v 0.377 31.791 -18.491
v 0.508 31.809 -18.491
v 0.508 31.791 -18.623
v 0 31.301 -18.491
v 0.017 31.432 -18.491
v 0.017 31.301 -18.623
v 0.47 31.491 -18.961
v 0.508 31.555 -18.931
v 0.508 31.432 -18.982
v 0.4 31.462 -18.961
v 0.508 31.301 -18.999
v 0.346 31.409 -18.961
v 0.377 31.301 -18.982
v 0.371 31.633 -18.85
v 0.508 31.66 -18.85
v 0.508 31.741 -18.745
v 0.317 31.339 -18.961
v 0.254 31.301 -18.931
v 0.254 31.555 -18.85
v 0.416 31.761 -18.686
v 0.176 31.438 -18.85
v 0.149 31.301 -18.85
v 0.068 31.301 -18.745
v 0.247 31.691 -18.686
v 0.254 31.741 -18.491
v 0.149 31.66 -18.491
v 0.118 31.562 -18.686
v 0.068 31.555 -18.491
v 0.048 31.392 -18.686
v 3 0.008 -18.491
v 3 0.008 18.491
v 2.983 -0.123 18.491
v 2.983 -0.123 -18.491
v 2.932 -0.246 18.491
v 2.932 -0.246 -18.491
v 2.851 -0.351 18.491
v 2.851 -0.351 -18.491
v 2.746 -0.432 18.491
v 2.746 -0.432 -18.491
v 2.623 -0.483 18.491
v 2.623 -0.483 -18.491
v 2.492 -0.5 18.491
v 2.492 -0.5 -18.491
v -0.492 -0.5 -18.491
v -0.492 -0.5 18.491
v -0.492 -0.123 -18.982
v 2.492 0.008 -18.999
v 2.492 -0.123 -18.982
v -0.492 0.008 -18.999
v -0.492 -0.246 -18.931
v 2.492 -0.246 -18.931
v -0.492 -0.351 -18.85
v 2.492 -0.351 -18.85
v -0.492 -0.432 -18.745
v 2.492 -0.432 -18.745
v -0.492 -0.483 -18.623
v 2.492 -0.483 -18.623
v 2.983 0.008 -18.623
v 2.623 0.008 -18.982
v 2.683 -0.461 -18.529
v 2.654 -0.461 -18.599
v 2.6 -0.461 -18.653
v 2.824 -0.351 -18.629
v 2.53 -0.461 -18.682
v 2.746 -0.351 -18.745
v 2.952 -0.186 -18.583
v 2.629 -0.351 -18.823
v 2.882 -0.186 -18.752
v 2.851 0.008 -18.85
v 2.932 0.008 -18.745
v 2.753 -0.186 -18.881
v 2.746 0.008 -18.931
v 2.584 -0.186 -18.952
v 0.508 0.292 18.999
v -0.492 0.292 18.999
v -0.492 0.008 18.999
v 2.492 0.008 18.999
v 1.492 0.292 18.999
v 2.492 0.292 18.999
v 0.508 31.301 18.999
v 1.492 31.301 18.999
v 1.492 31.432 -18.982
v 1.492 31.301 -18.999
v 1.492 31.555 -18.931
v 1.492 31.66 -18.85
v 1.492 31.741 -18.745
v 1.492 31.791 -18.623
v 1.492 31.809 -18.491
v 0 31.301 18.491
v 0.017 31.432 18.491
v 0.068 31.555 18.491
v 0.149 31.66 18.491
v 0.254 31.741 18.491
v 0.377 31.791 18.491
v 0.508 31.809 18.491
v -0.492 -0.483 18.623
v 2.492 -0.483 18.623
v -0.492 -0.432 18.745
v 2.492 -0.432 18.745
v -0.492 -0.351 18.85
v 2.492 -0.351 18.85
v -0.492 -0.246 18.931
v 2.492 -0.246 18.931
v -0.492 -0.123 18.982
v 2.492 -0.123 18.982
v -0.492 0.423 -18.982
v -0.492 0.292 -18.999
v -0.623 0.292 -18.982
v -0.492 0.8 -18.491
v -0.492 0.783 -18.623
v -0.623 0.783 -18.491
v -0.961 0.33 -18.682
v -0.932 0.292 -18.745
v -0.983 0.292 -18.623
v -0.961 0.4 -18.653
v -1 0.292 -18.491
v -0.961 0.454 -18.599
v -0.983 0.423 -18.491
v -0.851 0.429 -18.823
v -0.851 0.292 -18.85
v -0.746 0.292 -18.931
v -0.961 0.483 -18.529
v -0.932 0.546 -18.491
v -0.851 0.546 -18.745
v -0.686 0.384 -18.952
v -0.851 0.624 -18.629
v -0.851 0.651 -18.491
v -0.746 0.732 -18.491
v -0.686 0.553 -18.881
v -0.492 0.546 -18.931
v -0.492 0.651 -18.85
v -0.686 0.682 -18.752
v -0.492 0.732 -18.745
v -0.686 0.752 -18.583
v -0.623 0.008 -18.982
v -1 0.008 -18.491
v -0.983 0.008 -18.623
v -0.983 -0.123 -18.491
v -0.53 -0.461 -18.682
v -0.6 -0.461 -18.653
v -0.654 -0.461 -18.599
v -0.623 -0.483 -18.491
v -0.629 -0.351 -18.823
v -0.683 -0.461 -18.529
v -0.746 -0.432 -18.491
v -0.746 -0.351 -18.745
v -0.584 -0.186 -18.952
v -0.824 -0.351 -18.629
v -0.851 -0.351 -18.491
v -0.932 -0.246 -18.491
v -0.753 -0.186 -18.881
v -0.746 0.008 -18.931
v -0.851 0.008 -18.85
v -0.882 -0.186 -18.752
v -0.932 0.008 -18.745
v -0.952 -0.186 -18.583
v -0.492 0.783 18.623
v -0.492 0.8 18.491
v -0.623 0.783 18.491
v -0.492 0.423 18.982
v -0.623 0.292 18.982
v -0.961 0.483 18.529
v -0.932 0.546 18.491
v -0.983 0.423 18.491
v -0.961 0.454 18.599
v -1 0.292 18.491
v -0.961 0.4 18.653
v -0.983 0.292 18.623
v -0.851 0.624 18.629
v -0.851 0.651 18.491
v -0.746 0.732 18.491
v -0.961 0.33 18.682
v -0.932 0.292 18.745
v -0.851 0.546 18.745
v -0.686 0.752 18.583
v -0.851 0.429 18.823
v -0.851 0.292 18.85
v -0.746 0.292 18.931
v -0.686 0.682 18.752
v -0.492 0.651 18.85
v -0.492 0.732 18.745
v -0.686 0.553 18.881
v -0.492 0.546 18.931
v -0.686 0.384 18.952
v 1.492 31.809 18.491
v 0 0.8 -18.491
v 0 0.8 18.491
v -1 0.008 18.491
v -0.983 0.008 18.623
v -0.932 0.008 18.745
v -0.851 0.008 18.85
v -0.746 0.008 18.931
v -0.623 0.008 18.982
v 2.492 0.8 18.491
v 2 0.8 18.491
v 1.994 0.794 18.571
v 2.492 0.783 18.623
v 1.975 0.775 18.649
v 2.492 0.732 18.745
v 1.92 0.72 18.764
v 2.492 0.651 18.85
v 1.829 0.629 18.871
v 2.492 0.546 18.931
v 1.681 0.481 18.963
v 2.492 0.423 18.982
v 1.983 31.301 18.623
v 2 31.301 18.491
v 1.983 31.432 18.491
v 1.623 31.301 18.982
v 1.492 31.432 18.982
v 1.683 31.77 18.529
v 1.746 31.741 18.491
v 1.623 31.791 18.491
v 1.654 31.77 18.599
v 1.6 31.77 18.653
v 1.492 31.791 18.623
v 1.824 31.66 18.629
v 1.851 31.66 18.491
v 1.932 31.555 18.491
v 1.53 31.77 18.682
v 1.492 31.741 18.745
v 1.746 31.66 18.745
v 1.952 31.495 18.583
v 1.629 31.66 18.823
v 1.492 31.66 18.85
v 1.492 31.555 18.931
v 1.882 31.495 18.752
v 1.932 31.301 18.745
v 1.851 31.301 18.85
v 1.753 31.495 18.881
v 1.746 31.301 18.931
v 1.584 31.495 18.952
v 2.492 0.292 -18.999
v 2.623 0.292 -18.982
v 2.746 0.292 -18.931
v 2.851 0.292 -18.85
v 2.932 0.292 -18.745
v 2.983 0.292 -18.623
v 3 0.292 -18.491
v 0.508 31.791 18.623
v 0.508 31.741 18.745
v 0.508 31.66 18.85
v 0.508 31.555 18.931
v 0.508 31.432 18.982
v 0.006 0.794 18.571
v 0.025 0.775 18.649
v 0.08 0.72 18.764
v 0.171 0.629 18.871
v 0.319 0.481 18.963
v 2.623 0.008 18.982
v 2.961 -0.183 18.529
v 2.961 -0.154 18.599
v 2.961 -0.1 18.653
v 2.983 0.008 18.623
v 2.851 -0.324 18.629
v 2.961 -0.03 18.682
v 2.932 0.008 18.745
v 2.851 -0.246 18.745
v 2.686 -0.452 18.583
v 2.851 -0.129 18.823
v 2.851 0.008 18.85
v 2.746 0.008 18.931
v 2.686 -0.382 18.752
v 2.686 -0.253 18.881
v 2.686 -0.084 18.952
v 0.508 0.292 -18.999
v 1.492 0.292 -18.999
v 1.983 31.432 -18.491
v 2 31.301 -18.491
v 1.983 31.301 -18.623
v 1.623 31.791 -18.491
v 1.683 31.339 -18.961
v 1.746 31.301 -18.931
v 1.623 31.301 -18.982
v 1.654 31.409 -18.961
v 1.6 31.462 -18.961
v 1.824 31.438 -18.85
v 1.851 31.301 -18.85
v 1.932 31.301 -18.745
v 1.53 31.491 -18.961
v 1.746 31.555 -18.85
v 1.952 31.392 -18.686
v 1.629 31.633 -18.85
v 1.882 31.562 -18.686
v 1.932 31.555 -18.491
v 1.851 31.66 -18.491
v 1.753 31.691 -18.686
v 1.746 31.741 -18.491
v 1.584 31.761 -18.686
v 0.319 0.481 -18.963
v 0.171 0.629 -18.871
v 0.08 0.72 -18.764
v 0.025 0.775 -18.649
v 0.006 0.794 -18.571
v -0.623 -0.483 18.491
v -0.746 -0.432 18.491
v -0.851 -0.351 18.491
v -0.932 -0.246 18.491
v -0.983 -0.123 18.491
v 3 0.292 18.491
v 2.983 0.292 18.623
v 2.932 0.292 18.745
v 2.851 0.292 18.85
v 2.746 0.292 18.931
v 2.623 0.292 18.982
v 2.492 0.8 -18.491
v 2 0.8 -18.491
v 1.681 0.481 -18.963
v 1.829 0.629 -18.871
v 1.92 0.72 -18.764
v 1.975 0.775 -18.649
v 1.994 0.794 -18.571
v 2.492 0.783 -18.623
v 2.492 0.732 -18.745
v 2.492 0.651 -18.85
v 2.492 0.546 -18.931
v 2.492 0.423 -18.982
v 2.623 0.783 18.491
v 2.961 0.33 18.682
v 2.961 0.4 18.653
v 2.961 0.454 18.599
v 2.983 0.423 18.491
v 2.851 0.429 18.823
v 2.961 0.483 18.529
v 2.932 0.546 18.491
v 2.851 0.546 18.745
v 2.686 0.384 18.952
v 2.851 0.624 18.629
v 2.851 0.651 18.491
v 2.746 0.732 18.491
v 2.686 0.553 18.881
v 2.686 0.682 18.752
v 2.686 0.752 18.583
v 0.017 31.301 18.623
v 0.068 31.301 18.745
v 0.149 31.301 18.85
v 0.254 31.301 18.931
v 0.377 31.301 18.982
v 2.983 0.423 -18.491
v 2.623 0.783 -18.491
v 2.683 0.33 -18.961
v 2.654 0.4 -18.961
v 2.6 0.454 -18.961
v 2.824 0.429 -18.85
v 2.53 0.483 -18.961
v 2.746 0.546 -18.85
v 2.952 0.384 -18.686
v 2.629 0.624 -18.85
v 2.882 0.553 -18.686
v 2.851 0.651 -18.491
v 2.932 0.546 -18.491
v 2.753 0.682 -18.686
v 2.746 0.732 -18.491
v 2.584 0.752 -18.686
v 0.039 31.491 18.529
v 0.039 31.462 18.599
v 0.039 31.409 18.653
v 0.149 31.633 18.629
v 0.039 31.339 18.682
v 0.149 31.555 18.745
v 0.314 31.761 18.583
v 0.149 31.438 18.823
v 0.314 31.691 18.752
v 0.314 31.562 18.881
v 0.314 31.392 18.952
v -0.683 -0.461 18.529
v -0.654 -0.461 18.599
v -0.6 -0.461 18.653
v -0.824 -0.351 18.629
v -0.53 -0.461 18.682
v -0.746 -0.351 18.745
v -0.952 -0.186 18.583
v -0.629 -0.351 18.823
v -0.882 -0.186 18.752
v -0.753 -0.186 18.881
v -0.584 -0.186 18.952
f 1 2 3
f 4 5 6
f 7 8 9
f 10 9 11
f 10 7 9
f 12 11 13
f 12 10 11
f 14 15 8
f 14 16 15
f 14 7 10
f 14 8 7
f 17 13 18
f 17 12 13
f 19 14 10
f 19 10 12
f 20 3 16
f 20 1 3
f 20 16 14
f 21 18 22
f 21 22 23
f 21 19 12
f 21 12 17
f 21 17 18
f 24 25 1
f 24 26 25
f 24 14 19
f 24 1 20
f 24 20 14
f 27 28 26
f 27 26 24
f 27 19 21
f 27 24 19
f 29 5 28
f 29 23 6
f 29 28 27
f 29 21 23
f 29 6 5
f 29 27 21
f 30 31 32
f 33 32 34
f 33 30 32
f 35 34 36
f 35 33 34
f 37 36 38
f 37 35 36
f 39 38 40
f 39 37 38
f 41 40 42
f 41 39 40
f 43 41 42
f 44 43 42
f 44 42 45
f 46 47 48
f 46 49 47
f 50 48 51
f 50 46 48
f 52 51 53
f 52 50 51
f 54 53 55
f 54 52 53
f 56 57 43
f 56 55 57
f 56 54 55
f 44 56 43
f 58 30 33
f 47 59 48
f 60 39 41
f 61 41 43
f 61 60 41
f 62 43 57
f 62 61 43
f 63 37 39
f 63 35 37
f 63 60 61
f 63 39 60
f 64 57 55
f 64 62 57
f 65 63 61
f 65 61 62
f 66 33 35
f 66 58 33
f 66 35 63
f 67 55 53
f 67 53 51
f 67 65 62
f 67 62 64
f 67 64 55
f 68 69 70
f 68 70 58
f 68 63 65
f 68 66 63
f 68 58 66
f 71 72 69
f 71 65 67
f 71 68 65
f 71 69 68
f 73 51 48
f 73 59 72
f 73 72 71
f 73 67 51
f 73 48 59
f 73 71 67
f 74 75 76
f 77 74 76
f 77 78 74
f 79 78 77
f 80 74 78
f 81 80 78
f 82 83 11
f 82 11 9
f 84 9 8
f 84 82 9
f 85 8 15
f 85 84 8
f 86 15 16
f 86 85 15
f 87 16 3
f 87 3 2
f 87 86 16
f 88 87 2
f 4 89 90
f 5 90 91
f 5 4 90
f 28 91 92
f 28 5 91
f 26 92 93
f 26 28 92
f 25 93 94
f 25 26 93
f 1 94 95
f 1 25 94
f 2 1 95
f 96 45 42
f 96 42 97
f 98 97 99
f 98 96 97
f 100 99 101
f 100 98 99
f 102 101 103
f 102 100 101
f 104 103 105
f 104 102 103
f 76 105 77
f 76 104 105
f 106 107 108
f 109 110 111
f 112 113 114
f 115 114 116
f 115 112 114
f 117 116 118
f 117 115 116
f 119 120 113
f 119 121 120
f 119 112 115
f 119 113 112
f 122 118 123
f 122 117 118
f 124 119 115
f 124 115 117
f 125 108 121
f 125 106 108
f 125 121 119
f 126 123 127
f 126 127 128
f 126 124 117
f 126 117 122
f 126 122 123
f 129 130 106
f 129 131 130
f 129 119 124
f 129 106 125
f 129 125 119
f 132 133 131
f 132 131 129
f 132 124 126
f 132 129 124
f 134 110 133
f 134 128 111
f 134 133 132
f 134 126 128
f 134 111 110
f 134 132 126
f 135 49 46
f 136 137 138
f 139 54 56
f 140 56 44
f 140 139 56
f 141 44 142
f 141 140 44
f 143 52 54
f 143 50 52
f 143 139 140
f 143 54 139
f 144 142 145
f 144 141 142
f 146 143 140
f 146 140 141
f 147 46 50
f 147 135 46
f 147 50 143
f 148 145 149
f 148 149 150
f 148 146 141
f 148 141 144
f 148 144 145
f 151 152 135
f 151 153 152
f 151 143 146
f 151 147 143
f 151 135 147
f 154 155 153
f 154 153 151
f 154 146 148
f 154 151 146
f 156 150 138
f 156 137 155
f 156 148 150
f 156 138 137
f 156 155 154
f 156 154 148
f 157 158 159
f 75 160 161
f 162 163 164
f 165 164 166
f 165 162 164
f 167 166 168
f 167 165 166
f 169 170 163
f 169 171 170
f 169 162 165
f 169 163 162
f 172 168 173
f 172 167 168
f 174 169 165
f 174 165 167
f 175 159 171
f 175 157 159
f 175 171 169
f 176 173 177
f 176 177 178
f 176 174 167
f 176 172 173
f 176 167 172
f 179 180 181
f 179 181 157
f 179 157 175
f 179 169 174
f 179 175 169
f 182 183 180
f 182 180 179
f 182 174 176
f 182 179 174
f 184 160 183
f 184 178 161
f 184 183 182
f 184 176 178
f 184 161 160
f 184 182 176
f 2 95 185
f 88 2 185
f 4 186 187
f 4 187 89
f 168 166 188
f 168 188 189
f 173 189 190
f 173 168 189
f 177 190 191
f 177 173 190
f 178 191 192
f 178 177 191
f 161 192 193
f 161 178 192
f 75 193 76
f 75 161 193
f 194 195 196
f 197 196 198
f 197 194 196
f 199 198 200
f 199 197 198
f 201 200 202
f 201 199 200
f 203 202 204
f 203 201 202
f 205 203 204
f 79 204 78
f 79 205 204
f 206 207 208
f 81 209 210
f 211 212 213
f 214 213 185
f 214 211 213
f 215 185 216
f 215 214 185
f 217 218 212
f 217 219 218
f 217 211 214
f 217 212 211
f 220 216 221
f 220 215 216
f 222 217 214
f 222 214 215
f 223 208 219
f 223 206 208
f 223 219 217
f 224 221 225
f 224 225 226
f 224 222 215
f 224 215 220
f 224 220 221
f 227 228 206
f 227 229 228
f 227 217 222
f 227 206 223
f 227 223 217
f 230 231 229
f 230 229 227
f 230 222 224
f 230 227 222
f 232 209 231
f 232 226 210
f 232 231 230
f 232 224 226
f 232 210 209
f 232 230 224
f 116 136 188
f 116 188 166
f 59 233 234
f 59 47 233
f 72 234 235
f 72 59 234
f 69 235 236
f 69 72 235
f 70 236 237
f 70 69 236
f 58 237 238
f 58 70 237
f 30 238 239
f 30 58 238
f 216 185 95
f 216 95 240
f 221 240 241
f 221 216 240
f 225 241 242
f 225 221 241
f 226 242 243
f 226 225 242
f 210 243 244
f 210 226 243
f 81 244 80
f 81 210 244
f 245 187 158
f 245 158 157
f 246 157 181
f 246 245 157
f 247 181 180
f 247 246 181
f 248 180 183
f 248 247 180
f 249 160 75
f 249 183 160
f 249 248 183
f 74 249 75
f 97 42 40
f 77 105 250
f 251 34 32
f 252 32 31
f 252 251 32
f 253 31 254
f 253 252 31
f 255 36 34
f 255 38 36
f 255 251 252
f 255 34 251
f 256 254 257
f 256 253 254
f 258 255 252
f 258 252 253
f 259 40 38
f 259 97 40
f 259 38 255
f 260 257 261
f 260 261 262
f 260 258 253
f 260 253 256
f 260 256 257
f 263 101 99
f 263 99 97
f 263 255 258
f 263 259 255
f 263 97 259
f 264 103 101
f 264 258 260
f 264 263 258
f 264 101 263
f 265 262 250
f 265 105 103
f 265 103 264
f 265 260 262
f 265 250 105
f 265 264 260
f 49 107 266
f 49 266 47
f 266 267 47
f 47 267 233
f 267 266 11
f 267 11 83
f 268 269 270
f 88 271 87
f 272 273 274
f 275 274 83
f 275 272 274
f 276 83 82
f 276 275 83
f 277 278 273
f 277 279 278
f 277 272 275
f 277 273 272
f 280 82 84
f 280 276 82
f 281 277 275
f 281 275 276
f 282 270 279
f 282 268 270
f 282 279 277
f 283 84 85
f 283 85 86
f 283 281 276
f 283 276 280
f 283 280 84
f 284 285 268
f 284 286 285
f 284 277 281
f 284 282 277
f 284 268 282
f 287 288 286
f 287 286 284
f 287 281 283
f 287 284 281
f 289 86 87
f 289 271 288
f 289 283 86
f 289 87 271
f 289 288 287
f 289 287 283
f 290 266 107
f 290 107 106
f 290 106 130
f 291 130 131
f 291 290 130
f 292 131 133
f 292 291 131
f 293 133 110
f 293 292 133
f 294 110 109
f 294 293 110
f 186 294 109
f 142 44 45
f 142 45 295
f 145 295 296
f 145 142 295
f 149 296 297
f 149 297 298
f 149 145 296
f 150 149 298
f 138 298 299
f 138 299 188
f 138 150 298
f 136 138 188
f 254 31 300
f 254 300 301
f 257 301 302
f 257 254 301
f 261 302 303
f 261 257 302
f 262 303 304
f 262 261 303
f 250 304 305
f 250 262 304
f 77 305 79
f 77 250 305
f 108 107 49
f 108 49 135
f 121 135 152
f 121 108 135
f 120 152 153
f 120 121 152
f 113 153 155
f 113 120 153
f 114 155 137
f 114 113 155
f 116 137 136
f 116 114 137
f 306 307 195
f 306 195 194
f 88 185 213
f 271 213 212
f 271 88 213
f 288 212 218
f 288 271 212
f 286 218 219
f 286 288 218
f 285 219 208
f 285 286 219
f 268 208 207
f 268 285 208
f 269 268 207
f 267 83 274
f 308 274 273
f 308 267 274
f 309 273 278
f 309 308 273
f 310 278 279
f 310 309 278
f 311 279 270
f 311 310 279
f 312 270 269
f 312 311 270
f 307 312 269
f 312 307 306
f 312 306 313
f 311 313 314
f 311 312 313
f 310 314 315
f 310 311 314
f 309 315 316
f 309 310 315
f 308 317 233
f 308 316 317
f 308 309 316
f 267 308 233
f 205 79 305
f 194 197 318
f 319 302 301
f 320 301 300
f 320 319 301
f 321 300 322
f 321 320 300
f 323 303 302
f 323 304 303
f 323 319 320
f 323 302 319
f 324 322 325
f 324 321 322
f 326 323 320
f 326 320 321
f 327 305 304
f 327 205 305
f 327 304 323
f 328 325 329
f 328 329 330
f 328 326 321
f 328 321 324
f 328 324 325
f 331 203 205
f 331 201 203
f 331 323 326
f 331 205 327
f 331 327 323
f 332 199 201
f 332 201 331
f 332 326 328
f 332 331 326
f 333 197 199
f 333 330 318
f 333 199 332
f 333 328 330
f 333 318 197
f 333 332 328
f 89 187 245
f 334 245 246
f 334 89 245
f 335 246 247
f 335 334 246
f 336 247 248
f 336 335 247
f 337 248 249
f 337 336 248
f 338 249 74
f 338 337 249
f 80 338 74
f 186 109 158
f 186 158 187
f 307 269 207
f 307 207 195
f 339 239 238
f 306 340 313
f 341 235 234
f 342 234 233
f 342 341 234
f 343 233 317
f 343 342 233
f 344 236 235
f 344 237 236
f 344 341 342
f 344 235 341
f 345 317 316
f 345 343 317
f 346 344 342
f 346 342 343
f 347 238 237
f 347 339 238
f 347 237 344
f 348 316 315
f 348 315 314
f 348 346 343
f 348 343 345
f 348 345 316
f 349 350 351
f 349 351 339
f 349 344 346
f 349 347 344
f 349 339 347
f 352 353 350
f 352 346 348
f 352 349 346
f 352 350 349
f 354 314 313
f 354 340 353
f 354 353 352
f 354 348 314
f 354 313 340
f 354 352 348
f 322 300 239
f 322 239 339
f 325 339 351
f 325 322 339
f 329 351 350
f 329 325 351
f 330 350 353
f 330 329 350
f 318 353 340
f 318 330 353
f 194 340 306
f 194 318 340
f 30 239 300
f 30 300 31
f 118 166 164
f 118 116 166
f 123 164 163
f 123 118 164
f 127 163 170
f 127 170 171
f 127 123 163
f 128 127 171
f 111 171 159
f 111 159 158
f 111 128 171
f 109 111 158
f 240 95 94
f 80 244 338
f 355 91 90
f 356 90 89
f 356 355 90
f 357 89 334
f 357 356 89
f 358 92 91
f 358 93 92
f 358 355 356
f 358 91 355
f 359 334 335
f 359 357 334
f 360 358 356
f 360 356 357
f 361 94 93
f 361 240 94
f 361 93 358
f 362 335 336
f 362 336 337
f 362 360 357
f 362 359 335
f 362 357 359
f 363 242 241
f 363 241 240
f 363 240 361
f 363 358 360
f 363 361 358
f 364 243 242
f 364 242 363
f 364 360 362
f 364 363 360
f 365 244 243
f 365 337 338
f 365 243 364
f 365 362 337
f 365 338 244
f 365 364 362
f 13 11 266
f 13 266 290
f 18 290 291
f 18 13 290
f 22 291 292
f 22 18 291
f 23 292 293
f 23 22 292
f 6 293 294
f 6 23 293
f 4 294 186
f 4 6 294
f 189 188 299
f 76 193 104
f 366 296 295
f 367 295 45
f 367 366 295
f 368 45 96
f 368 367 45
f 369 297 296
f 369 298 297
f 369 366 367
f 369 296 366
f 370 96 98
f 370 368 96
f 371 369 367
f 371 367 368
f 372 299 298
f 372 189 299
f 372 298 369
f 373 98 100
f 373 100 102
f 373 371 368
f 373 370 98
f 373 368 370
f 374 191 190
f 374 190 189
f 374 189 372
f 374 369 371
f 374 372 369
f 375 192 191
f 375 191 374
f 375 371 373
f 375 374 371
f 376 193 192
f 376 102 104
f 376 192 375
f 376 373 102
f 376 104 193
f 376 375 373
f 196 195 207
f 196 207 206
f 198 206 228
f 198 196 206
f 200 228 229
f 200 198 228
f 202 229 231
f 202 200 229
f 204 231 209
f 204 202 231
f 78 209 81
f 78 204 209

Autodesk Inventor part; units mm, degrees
ref_plane "YZ Plane" through (0, 0, 0) normal (1, 0, 0) x (0, 1, 0)
ref_plane "XZ Plane" through (0, 0, 0) normal (0, 1, 0) x (-1, 0, 0)
ref_plane "XY Plane" through (0, 0, 0) normal (0, 0, 1) x (1, 0, 0)
sketch "Sketch1" plane through (0, 0, 0) normal (0, 0, 1) x (1, 0, 0)
  line L0 (3, 0.8) -> (3, -0.5)
  line L1 (3, -0.5) -> (-1, -0.5)
  line L2 (-1, -0.5) -> (-1, 0.8)
  line L3 (0, 0.8) -> (0, 31.8088)
  line L4 (0, 31.8088) -> (2, 31.8088)
  line L5 (2, 31.8088) -> (2, 0.8)
  line L6 (-1, 0.8) -> (0, 0.8)
  line L7 (2, 0.8) -> (3, 0.8)
  line L8 (-1, 0.8) -> (0, 0.8)
  line L9 (2, 0.8) -> (2.5, 0.8)
  point P0 (0, 0)
  point P1 (1, -0.5)
  point P2 (1, -0.5)
  dimension "d0" = 32.3088
  dimension "d1" = 4
  dimension "d2" = 1.3
  dimension "d3" = 1
  dimension "d4" = 1
extrude "Extrusion1" add sketch "Sketch1" along normal mid plane 37.9984
fillet "Fillet1" radius 0.508 22 edges at (2, 16.3044, 18.9992) (2, 31.8088, 0) (2, 16.3044, -18.9992) (2.5, 0.8, 18.9992) (-0.5, 0.8, 18.9992) (-1, 0.15, 18.9992) (1, -0.5, 18.9992) (3, 0.15, 18.9992) (3, 0.8, 0) (1, 31.8088, 18.9992) (0, 16.3044, 18.9992) (0, 31.8088, 0) (2.5, 0.8, -18.9992) (3, 0.15, -18.9992) (-0.5, 0.8, -18.9992) (-1, 0.15, -18.9992) (1, -0.5, -18.9992) (-1, 0.8, 0) (-1, -0.5, 0) (1, 31.8088, -18.9992) (3, -0.5, 0) (0, 16.3044, -18.9992)
equation "\"d4\" = d3"
properties part number "Tall Conveyor Belt Inserts" material "Acetal Resin, White"
